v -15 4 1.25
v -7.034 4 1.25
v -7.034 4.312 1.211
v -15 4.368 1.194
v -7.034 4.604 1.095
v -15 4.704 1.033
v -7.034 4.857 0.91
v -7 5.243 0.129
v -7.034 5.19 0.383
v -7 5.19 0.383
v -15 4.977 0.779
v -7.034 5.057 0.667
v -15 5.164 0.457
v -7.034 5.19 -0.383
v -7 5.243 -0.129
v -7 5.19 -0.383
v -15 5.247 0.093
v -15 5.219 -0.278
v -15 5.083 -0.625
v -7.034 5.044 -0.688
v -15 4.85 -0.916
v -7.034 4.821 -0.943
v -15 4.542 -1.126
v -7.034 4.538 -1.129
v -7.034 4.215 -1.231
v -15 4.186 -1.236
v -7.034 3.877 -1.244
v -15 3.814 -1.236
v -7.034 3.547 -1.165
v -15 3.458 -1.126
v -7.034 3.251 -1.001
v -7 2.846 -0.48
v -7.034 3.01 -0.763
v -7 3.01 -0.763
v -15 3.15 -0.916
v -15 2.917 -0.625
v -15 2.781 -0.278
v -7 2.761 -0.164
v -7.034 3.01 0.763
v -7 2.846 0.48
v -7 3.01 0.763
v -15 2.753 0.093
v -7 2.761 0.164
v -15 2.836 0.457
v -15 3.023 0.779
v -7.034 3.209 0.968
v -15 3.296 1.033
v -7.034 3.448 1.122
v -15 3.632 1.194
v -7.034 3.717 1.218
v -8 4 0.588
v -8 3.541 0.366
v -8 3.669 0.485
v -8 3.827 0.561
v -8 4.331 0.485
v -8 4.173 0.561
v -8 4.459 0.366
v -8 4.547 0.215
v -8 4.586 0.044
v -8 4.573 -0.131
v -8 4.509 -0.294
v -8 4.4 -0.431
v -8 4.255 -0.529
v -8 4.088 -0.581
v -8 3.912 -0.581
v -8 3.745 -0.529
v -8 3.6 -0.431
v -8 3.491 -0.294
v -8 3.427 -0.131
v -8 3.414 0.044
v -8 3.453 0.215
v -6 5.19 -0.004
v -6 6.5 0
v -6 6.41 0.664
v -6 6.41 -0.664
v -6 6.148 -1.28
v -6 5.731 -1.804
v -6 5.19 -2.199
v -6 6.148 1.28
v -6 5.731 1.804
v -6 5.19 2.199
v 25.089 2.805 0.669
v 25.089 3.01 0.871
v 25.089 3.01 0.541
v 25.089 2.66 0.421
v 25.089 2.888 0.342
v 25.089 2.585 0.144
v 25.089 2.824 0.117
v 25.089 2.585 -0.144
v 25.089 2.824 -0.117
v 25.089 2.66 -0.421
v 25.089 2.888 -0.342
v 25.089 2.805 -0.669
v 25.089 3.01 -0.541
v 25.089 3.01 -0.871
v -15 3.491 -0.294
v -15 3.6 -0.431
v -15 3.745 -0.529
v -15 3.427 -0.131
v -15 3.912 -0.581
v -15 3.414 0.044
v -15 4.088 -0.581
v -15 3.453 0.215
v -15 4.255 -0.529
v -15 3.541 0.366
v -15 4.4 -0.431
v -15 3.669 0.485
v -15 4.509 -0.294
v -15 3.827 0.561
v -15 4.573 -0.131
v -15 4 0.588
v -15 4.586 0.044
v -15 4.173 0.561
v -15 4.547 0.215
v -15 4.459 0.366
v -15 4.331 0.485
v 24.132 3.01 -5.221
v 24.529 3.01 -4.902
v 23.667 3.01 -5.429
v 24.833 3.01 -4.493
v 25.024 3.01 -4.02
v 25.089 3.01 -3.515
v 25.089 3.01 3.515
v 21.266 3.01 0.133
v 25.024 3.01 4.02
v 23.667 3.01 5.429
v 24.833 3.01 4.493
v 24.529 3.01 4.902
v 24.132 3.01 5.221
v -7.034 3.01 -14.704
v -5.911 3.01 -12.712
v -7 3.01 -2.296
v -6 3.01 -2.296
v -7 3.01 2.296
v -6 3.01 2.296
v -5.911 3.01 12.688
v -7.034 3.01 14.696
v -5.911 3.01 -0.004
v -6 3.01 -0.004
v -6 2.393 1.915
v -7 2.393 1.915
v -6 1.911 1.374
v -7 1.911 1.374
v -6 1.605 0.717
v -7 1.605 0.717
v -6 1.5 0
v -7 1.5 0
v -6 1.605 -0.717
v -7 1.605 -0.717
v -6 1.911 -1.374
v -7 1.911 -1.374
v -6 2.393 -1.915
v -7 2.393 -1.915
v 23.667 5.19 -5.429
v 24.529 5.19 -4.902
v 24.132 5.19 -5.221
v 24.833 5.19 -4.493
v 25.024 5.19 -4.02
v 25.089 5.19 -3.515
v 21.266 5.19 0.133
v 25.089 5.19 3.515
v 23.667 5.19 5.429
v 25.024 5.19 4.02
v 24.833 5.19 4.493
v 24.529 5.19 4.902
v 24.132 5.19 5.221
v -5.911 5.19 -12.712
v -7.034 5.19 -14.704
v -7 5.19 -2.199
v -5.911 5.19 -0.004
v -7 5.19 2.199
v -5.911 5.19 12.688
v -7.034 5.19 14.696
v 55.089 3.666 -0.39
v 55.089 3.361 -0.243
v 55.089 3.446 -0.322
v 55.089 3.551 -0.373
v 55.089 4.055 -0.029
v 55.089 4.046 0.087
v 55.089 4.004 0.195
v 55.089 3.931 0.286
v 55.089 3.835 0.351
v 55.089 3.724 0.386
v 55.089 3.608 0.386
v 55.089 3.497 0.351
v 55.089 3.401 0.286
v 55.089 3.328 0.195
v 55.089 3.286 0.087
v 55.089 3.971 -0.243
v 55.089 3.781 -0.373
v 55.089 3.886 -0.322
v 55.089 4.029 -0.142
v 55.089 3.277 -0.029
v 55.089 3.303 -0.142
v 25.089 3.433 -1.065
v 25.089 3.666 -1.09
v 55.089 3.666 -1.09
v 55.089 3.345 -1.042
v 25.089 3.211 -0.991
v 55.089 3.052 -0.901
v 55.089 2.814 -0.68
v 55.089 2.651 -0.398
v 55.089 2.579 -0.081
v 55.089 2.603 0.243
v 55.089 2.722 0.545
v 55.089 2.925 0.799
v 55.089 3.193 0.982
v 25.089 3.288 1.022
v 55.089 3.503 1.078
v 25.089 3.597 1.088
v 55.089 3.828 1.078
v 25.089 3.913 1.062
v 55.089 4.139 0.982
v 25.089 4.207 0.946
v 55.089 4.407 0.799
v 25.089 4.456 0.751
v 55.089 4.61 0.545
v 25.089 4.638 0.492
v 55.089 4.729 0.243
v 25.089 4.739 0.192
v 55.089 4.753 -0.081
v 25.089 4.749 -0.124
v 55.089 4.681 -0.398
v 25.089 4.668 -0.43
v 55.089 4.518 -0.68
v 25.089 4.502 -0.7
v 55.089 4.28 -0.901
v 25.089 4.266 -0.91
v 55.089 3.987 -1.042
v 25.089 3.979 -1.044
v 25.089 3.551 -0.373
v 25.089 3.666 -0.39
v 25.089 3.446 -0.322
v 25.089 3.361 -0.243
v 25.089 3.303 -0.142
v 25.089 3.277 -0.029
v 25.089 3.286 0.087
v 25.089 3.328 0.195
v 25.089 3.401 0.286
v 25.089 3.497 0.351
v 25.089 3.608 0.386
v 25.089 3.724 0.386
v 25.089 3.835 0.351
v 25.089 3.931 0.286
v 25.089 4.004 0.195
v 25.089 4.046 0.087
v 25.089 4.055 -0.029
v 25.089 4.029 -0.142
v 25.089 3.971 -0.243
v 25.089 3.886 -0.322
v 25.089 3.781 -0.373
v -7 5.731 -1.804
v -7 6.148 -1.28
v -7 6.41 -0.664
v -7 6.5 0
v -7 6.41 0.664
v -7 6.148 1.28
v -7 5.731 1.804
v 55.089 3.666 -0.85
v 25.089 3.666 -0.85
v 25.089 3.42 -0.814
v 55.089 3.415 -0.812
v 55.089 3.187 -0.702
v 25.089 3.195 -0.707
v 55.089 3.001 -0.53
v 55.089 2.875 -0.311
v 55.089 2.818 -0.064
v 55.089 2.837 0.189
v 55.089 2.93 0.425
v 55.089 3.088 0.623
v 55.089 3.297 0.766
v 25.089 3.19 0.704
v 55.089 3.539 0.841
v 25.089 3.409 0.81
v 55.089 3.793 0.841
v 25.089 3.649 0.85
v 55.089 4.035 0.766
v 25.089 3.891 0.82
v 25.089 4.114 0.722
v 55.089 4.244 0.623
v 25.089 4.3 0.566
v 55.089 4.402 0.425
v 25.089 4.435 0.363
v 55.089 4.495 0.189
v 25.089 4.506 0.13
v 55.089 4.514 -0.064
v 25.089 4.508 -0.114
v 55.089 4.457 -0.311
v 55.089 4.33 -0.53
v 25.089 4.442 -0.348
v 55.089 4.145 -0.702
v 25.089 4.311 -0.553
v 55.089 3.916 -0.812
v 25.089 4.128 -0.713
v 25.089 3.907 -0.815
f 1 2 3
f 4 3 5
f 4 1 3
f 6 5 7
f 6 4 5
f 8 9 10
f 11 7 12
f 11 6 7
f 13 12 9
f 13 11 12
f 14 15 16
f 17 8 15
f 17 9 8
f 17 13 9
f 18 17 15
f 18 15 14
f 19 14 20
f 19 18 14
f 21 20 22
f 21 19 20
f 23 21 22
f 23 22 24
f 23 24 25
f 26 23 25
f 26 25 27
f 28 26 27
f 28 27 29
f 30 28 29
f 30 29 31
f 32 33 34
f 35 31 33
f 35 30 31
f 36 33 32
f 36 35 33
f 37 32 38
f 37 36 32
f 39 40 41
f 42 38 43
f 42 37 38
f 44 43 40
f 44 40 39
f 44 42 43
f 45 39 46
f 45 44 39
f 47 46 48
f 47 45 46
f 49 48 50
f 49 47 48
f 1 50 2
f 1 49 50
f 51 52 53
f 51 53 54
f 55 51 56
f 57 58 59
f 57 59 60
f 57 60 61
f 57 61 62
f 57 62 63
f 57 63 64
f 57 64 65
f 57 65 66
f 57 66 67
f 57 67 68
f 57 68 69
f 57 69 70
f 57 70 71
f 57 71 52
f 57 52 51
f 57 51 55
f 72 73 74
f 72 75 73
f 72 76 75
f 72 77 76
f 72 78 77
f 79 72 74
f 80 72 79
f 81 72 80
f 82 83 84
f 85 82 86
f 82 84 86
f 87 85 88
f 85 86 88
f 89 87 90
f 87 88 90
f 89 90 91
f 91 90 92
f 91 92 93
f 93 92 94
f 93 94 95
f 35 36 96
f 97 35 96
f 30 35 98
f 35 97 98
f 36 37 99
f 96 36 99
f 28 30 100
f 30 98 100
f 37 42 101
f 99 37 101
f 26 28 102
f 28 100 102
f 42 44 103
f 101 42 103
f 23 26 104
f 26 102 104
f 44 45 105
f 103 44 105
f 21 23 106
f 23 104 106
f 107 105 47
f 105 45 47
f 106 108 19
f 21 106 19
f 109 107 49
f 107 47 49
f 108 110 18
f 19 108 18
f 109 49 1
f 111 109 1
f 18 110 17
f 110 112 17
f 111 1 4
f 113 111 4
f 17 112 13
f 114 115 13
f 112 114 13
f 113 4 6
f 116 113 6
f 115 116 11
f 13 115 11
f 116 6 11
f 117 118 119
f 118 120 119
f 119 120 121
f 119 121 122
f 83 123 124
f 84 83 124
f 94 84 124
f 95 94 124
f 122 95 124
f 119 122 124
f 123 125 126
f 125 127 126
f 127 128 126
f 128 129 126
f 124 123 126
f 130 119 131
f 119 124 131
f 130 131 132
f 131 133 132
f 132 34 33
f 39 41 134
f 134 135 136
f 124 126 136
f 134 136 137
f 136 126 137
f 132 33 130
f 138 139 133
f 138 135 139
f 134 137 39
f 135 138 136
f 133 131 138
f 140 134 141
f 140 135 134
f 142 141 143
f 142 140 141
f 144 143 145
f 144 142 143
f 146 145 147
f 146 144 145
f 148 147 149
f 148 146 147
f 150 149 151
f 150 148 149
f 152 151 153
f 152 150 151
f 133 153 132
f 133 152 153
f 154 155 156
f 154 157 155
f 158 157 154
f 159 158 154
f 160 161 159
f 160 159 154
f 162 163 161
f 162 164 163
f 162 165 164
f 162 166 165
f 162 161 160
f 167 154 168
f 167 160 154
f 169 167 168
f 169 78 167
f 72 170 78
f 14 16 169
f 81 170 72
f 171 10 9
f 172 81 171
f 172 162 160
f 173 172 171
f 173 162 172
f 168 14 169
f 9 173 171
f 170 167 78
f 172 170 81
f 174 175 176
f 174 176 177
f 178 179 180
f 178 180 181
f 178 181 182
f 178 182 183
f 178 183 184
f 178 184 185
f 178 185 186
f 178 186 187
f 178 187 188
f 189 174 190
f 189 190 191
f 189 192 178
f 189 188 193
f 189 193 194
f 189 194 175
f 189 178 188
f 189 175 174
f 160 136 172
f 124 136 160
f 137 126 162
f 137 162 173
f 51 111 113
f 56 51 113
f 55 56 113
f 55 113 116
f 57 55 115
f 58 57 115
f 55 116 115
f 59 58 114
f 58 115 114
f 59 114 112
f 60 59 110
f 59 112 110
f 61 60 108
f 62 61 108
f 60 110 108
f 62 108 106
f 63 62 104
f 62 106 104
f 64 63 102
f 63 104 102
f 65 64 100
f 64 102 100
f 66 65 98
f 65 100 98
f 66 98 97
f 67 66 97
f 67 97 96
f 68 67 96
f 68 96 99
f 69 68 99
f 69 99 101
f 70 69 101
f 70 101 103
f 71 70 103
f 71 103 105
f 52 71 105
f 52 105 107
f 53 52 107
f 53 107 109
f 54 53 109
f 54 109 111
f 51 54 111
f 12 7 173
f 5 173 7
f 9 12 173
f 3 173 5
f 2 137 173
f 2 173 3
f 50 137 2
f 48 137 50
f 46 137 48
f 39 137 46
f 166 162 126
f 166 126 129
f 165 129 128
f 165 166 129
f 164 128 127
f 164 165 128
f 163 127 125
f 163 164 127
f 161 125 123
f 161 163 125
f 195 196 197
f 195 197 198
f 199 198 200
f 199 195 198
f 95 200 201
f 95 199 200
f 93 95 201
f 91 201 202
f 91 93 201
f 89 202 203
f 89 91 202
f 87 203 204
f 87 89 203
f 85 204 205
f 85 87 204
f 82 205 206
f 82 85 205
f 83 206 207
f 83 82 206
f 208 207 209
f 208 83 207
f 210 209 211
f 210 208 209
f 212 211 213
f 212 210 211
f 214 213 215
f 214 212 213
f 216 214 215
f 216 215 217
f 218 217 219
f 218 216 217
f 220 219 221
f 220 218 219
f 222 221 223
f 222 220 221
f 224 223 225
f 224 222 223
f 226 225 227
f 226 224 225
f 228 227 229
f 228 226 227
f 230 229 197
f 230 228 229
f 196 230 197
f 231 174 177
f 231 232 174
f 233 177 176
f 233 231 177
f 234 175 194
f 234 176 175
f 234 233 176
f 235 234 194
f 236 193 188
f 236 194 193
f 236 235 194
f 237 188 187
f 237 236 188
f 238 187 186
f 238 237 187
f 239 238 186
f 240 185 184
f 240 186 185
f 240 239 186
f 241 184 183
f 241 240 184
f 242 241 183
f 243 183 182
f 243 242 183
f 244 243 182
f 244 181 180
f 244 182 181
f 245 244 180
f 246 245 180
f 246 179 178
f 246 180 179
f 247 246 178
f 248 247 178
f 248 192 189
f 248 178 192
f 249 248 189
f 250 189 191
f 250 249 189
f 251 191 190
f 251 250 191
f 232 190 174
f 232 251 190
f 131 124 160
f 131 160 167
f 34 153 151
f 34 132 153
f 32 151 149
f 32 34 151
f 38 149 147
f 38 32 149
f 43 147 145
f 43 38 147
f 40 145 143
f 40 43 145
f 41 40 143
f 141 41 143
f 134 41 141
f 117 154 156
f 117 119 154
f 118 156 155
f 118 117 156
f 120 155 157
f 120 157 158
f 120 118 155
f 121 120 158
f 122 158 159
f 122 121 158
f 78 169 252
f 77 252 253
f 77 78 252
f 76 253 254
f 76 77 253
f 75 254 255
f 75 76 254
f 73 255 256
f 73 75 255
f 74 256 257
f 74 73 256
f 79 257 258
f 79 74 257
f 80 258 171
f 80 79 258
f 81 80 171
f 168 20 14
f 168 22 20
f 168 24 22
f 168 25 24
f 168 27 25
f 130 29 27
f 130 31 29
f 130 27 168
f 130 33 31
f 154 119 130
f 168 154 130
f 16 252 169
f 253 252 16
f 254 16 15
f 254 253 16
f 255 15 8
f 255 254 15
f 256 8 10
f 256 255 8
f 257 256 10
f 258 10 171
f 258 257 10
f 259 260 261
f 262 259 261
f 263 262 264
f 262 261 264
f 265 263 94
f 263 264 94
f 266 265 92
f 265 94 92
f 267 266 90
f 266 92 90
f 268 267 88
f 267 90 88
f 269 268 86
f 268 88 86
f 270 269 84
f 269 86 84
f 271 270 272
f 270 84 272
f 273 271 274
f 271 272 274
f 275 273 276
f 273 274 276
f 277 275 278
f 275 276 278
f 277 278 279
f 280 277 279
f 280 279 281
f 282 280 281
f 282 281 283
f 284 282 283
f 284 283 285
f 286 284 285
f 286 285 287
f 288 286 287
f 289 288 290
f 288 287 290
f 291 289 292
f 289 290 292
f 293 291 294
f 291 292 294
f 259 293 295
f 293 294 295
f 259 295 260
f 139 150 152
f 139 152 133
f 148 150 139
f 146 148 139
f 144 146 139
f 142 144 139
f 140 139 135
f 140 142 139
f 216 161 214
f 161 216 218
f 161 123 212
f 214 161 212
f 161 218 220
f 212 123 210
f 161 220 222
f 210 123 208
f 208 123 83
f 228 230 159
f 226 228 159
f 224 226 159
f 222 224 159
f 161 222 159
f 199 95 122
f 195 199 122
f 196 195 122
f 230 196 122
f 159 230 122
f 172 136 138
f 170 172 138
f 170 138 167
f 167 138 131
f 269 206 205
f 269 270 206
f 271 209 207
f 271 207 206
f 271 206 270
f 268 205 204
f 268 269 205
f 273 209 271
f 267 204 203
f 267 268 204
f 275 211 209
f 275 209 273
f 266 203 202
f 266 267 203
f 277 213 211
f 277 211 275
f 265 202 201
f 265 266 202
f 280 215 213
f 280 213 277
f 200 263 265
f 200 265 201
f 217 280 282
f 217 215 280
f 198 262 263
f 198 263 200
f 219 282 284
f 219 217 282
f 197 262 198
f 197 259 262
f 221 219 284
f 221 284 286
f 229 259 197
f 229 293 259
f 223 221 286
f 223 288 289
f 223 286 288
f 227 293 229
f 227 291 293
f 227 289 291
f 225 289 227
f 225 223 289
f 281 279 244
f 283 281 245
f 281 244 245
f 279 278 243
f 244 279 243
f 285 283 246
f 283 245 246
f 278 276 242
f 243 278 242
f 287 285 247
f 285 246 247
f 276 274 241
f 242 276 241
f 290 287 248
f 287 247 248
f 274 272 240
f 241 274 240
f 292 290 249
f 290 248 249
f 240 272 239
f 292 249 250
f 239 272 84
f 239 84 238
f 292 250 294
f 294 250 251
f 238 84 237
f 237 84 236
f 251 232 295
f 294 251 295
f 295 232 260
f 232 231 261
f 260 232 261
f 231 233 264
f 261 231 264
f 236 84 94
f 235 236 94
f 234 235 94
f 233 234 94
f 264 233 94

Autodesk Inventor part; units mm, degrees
ref_plane "YZ Plane" through (0, 0, 0) normal (1, 0, 0) x (0, 1, 0)
ref_plane "XY Plane" through (0, 0, 0) normal (0, 0, 1) x (1, 0, 0)
sketch "Sketch1" plane through (0, 0, 0) normal (0, 1, 0) x (-1, 0, 0)
  arc A0 (0, -5) -> (0, 5) centre (0, 0) ccw
  line L0 (0, 5) -> (0, -5)
  dimension "d0" = 10
extrude "Extrusion1" add sketch "Sketch1" along normal blind 10
sketch "Sketch2" plane through (0, 0, 0) normal (1, 0, 0) x (0, 1, 0)
  line L0 (8.0172, -4.5) -> (8.0172, 4.5)
  line L1 (8.0172, 4.5) -> (2.5172, 4.5)
  line L2 (2.5172, -4.5) -> (0.0172, -2)
  line L3 (2.5172, 4.5) -> (0.0172, 2)
  line L4 (0.0172, -2) -> (0.0172, 2)
  line L5 (8.0172, -4.5) -> (2.5172, -4.5)
  point P0 (0, 0)
  dimension "d3" = 9
  dimension "d4" = 8
sketch "Sketch3" plane through (0, 0, 0) normal (1, 0, 0) x (0, 1, 0)
  line L0 (0, 2) -> (3, 5)
  arc A0 (3, 5) -> (0, 2) centre (1, 4) ccw
  line L1 (0, -2) -> (4, -6)
  arc A1 (0, -2) -> (4, -6) centre (1.75, -4.25) ccw
  line L2 (8.0325, 5) -> (11, 5)
  line L3 (11, 5) -> (11, -6)
  line L4 (11, -6) -> (8.0325, -6)
  line L5 (8.0325, -6) -> (8.0325, 5)
  line L6 (2.4911, 4.4911) -> (5, 7)
  line L7 (2.4911, 4.4911) -> (8.0325, 4.4911)
  arc A2 (8.0325, 4.4911) -> (5, 7) centre (7, 6.3303) ccw
  line L8 (2.4911, -4.4911) -> (8.5706, -4.4911)
  arc A3 (2.4911, -4.4911) -> (8.5706, -4.4911) centre (5.5309, -7.5041) ccw
  point P0 (0, 0)
extrude "Extrusion2" cut sketch "Sketch3" against normal through all
sketch "Sketch4" plane through (0, 0, 0) normal (0, 1, 0) x (-1, 0, 0)
  arc A0 (1.0726, -4.4911) -> (1.0726, 4.4911) centre (-1.125, 0) ccw
  arc A1 (1.0726, 4.4911) -> (1.0726, -4.4911) centre (-0.4517, 0) ccw
  point P0 (0, 0)
  point P1 (2.1976, -4.4911)
  point P2 (2.1976, 4.4911)
  dimension "d9" = 1.125
  dimension "d10" = 1.125
extrude "Extrusion3" cut sketch "Sketch4" along normal through all both and the other way through all
sketch "Sketch5" plane through (0, 0, 0) normal (1, 0, 0) x (0, 1, 0)
  line L0 (1.6, -1.2445) -> (1.6, 1.1555)
  line L1 (6.4325, 2.6911) -> (3.1125, 2.6911)
  line L2 (6.4325, -2.6911) -> (6.4325, 2.6911)
  line L3 (6.4325, -2.6911) -> (3.1125, -2.6911)
  line L4 (0, 2) -> (0, -2) projected
  line L5 (8.0325, 4.4911) -> (8.0325, -4.4911) projected
  line L6 (0, 2) -> (2.4911, 4.4911) projected
  line L7 (2.4911, 4.4911) -> (8.0325, 4.4911) projected
  line L8 (8.0325, 4.4911) -> (8.0325, -4.4911) projected
  line L9 (8.0325, -4.4911) -> (2.4911, -4.4911) projected
  line L10 (2.4911, -4.4911) -> (0, -2) projected
  line L11 (0, 2) -> (0, -2) projected
  line L12 (1.6, 1.1555) -> (3.1125, 2.6911)
  line L13 (1.6, -1.2445) -> (3.1125, -2.6911)
  line L14 (1.6, 4.6579) -> (1.6, -5.3823)
  arc A0 (1.6, 4.6579) -> (1.6, -5.3823) centre (3.2437, -0.3622) ccw
  line L15 (1.6, 1.1555) -> (5.4757, 5.0906)
  line L16 (1.6, 1.1555) -> (1.6, 7.5999)
  arc A1 (5.4757, 5.0906) -> (1.6, 7.5999) centre (3.8837, 6.8794) ccw
  line L17 (3.1125, 2.6911) -> (12.4034, 2.6911)
  line L18 (3.1125, 2.6911) -> (8.5318, 8.1936)
  arc A2 (12.4034, 2.6911) -> (8.5318, 8.1936) centre (8.3272, 3.9364) ccw
  line L19 (6.4325, 2.6911) -> (13.6333, 2.6911)
  line L20 (6.4325, 2.6911) -> (6.4325, -9.3636)
  arc A3 (6.4325, -9.3636) -> (13.6333, 2.6911) centre (6.37, -1.1482) ccw
  line L21 (6.4325, -2.6911) -> (6.4325, -11.5775)
  line L22 (6.4325, -2.6911) -> (3.1125, -2.6911)
  line L23 (3.1125, -2.6911) -> (3.2437, -12.8567)
  arc A4 (3.2437, -12.8567) -> (6.4325, -9.3636) centre (5.6123, -11.8169) ccw
  line L24 (1.6, -1.2445) -> (1.6, -8.2222)
  line L25 (1.6, -1.2445) -> (3.1125, -2.6911)
  line L26 (3.1125, -2.6911) -> (3.1946, -9.0574)
  arc A5 (1.6, -8.2222) -> (3.1946, -9.0574) centre (2.6381, -8.1801) ccw
  point P0 (0, 0)
  dimension "d16" = 1.6
  dimension "d18" = 1.6
  dimension "d21" = 1.8
  dimension "d23" = 1.8
  dimension "d24" = 2.4
  dimension "d26" = 3.32
  dimension "d27" = 3.32
extrude "Extrusion4" cut sketch "Sketch5" against normal through all contours L14 L10 L4 L6 L0 | L13 L23 L9 L10 L14 | L14 L6 L7 L15 L12 | L3 L20 L9 L23 | L14 A0 L6 L4 L10 | L10 L9 L23 A5 L24 L14 | L15 L7 L5 L17 L1 | L14 L16 A1 L15 L7 L6 | L2 L17 L5 L9 L20 | L9 L20 A4 L23 | L15 L18 A2 L17 L5 L7 | L9 L5 L17 L19 A3 L20
sketch "Sketch6" plane through (0, 0, 0) normal (1, 0, 0) x (0, 1, 0)
  circle A0 centre (4, 0) radius 2.5
  line L0 (1.6, -1.2445) -> (1.6, 1.1555) projected
  point P0 (0, 0)
  dimension "d31" = 5
  dimension "d32" = 2.4
extrude "Extrusion5" add sketch "Sketch6" against normal blind 15
sketch "Sketch7" plane through (0, 0, 0) normal (0, 1, 0) x (-1, 0, 0)
  arc A0 (3.089, -2.6911) -> (3.7176, -1.2445) centre (-1.125, 0) ccw
  arc A1 (3.7397, 1.1555) -> (3.089, 2.6911) centre (-1.125, 0) ccw projected
  arc A2 (3.7176, -1.2445) -> (3.7397, 1.1555) centre (-1.125, 0) ccw
  arc A3 (3.089, 2.6911) -> (3.089, -2.6911) centre (1.3425, 0) ccw
  point P0 (0, 0)
extrude "Extrusion6" cut sketch "Sketch7" along normal through all
sketch "Sketch8" plane through (-15, 4, 0) normal (-1, 0, 0) x (0, 0, 1)
  circle A0 centre (0, 0) radius 0.5875
  point P0 (0, -4)
  dimension "d37" = 1.175
extrude "Extrusion7" cut sketch "Sketch8" against normal blind 7
sketch "Sketch9" plane through (0, 0, 0) normal (0, 1, 0) x (-1, 0, 0)
  line L0 (6, 3) -> (2, 3)
  line L1 (2, 3) -> (2, -3)
  line L2 (2, -3) -> (6, -3)
  line L3 (6, -3) -> (6, 3)
  point P0 (0, 0)
extrude "Extrusion8" cut sketch "Sketch9" along normal through all both and the other way through all
sketch "Sketch10" plane through (-15, 4, 0) normal (-1, 0, 0) x (0, 0, 1)
  circle A0 centre (0, 0) radius 1.25
  circle A1 centre (0, 0) radius 3.9528
  point P0 (0, -4)
  dimension "d69" = 2.5
extrude "Extrusion9" cut sketch "Sketch10" against normal blind 8
ref_plane "Work Plane1" through (0, 4.1, 0) normal (0, 1, 0) x (-1, 0, 0)
sketch "Sketch12" plane through (0, 4.1, 0) normal (0, 1, 0) x (-1, 0, 0)
  line L0 (15, -1) -> (15, 1)
  line L1 (5.9113, 12.6879) -> (5.9113, -12.7121)
  line L2 (5.9113, 12.6879) -> (-21.266, 0.1332)
  line L3 (-21.266, 0.1332) -> (5.9113, -12.7121)
  line L4 (7.0341, 14.6962) -> (7.0341, -14.7038)
  line L5 (2.03, -0.0038) -> (19.03, -0.0038)
  line L6 (-25.0887, 5) -> (-25.0887, -5)
  line L7 (-25.0887, 5) -> (7.0341, 14.6962)
  line L8 (-25.0887, -5) -> (7.0341, -14.7038)
  point P0 (0, 0)
  point P1 (0, 0)
  dimension "d61" = 25.4
  dimension "d62" = 29.4
  dimension "d63" = 14.7
  dimension "d64" = 10
  dimension "d67" = 31
extrude "Extrusion11" add sketch "Sketch12" along normal mid plane 2.18
sketch "Sketch13" plane through (25.0887, 3.01, -5) normal (1, 0, 0) x (0, 0, -1)
  circle A0 centre (-5, 0.6559) radius 0.39
  circle A1 centre (-5, 0.6559) radius 0.85
  circle A2 centre (-5, 0.6559) radius 1.09
  point P0 (-5, -3.01)
  dimension "d70" = 0.78
  dimension "d71" = 1.7
  dimension "d74" = 2.18
extrude "Extrusion13" add sketch "Sketch13" along normal blind 30
fillet "Fillet1" radius 2 1 edges at (25.0887, 4.1, -5)
fillet "Fillet2" radius 2 1 edges at (25.0887, 4.1, 5)
properties part number "piezo_mounted_whisk_deflector_SHORT_capillary_attachment"
